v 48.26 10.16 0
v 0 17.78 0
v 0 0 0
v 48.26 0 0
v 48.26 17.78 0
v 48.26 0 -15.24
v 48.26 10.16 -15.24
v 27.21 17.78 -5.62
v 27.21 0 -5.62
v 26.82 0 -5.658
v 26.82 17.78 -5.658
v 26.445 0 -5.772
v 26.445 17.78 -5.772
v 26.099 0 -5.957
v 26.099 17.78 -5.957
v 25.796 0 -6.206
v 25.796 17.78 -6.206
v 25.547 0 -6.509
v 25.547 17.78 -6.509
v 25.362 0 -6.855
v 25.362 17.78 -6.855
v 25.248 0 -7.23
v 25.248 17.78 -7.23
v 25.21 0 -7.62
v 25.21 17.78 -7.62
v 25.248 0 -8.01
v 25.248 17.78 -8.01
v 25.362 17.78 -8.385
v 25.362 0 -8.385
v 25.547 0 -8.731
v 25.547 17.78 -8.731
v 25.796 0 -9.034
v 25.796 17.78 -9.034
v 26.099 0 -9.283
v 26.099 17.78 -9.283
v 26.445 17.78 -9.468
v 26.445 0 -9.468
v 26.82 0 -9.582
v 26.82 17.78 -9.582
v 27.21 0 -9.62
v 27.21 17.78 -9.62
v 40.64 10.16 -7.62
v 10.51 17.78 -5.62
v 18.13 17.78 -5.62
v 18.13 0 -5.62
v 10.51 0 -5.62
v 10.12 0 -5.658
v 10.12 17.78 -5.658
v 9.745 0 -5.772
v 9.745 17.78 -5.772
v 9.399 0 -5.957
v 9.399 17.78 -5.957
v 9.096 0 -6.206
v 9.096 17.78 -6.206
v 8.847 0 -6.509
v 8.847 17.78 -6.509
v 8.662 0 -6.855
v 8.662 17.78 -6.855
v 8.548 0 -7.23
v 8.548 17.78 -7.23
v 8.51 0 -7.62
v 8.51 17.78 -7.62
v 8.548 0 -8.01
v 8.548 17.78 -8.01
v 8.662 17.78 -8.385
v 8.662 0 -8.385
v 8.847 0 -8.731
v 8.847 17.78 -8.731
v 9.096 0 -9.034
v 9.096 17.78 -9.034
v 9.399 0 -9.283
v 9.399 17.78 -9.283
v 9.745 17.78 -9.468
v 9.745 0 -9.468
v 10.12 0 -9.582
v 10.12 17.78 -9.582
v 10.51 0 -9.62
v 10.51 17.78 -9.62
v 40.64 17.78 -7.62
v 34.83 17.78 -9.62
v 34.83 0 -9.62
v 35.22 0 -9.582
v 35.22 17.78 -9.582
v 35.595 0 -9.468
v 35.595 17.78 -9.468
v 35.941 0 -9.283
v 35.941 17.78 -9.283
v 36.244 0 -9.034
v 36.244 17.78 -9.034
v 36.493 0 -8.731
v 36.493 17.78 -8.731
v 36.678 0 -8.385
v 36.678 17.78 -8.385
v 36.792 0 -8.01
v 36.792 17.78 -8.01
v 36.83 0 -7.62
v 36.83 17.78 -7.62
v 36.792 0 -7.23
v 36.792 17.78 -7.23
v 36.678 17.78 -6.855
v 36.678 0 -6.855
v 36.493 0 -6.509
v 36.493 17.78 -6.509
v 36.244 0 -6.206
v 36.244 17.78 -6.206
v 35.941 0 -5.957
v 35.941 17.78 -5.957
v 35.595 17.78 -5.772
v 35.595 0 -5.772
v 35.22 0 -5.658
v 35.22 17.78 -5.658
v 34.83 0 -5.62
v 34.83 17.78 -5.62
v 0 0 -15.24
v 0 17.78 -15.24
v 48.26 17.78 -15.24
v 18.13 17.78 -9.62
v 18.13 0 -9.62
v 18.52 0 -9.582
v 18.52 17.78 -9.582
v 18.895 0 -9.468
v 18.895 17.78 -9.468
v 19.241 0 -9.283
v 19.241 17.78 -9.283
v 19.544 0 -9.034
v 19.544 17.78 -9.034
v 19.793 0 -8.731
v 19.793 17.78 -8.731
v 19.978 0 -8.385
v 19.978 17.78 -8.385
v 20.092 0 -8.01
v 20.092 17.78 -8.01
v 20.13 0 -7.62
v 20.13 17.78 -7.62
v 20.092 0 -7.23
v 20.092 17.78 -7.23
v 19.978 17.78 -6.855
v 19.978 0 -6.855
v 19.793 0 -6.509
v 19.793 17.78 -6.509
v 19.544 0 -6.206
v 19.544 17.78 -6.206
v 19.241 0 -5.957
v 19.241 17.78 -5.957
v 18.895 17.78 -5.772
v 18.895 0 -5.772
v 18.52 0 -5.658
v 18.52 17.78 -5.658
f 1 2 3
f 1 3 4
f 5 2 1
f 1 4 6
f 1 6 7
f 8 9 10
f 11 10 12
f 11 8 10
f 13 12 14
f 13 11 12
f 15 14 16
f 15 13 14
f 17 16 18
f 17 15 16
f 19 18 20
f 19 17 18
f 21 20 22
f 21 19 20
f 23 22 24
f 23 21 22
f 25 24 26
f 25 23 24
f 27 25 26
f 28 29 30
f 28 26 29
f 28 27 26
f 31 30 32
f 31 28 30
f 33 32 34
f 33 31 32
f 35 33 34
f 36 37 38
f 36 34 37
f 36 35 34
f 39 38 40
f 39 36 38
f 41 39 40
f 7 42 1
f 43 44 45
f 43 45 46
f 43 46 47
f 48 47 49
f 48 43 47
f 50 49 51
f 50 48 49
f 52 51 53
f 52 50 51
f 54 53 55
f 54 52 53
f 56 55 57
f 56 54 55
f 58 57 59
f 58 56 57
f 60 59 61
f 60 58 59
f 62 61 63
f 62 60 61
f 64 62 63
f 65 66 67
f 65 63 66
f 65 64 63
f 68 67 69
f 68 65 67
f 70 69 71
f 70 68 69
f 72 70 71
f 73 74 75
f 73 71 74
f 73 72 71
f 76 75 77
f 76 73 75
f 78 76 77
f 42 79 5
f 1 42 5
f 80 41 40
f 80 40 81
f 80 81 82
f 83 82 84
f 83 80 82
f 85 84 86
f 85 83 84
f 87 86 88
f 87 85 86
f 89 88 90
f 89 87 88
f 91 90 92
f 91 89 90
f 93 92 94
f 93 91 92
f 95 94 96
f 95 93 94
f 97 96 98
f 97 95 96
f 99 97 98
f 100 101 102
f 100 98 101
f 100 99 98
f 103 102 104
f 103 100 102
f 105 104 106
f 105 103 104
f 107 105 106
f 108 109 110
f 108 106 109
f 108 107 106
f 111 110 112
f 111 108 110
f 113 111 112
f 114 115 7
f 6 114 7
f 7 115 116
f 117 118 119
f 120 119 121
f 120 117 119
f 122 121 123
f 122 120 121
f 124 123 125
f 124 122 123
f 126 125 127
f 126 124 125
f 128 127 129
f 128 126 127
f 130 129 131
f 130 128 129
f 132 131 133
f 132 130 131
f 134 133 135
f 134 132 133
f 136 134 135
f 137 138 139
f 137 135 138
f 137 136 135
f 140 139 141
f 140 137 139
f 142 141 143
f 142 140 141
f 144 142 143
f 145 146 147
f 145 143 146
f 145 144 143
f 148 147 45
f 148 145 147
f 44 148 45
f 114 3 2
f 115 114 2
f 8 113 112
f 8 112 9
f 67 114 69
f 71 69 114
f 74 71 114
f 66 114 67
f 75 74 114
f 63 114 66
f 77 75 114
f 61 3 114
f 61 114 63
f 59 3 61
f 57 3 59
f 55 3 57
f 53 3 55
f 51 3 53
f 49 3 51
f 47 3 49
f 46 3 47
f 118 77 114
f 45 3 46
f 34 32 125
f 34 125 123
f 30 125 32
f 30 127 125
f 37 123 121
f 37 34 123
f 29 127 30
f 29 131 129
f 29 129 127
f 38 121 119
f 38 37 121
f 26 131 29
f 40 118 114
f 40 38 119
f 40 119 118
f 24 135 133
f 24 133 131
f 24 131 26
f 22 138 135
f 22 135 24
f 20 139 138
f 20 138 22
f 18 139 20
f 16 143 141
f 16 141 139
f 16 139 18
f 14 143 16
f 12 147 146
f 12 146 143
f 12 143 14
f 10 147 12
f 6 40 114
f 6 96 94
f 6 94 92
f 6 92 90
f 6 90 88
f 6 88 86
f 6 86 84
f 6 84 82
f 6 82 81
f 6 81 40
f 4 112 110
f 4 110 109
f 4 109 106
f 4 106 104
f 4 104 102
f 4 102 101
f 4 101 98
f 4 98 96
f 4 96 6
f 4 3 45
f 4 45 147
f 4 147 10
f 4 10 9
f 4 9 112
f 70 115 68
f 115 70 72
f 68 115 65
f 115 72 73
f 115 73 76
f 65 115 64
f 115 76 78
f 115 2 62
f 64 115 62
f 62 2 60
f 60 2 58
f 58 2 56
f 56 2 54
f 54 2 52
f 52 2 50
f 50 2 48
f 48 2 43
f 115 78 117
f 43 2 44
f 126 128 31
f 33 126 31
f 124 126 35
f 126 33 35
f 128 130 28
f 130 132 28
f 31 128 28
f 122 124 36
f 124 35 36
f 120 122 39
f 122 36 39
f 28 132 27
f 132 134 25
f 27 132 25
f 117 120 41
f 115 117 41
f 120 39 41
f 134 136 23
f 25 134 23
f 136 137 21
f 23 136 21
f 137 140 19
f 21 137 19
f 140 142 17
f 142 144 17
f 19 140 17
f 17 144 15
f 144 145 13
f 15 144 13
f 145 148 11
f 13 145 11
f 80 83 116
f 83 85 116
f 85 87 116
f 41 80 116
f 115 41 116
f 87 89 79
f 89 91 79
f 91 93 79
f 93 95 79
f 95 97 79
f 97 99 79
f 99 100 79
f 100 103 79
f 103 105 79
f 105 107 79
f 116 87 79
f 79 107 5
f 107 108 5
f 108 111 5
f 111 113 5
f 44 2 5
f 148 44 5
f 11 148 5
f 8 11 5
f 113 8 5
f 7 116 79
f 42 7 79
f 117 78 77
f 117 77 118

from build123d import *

# Parameters (mm, degrees)
SKETCH1_W           = 48.26
SKETCH1_H           = 17.78
BOSS_EXTRUDE1_DEPTH = 15.24
CUT_EXTRUDE1_DEPTH  = 7.62
CUT_EXTRUDE2_DEPTH  = 18.78


with BuildPart() as part:
    # Sketch1 → Boss-Extrude1 (new body)
    with BuildSketch(Plane.XY):
        with Locations((24.13, 8.89)):
            Rectangle(SKETCH1_W, SKETCH1_H)
    extrude(amount=-BOSS_EXTRUDE1_DEPTH)

    # Sketch3 → Cut-Extrude1 (cut)
    with BuildSketch(Plane(origin=(0, 17.78, 0), x_dir=(1, 0, 0), z_dir=(0, 1, 0))):
        Polygon((48.26, 15.24), (40.64, 7.62), (48.26, 0), align=None)
    extrude(amount=-CUT_EXTRUDE1_DEPTH, mode=Mode.SUBTRACT)

    # Sketch4 → Cut-Extrude2 (cut, through all)
    with BuildSketch(Plane(origin=(0, 17.78, 0), x_dir=(1, 0, 0), z_dir=(0, 1, 0))):
        with BuildLine():
            Line((34.83, 5.62), (27.21, 5.62))
            ThreePointArc((27.21, 5.62), (25.21, 7.62), (27.21, 9.62))
            Line((27.21, 9.62), (34.83, 9.62))
            ThreePointArc((34.83, 9.62), (36.83, 7.62), (34.83, 5.62))
        make_face()
        with BuildLine():
            Line((18.13, 5.62), (10.51, 5.62))
            ThreePointArc((10.51, 5.62), (8.51, 7.62), (10.51, 9.62))
            Line((10.51, 9.62), (18.13, 9.62))
            ThreePointArc((18.13, 9.62), (20.13, 7.62), (18.13, 5.62))
        make_face()
    extrude(amount=-CUT_EXTRUDE2_DEPTH, mode=Mode.SUBTRACT)


solid = part.part
